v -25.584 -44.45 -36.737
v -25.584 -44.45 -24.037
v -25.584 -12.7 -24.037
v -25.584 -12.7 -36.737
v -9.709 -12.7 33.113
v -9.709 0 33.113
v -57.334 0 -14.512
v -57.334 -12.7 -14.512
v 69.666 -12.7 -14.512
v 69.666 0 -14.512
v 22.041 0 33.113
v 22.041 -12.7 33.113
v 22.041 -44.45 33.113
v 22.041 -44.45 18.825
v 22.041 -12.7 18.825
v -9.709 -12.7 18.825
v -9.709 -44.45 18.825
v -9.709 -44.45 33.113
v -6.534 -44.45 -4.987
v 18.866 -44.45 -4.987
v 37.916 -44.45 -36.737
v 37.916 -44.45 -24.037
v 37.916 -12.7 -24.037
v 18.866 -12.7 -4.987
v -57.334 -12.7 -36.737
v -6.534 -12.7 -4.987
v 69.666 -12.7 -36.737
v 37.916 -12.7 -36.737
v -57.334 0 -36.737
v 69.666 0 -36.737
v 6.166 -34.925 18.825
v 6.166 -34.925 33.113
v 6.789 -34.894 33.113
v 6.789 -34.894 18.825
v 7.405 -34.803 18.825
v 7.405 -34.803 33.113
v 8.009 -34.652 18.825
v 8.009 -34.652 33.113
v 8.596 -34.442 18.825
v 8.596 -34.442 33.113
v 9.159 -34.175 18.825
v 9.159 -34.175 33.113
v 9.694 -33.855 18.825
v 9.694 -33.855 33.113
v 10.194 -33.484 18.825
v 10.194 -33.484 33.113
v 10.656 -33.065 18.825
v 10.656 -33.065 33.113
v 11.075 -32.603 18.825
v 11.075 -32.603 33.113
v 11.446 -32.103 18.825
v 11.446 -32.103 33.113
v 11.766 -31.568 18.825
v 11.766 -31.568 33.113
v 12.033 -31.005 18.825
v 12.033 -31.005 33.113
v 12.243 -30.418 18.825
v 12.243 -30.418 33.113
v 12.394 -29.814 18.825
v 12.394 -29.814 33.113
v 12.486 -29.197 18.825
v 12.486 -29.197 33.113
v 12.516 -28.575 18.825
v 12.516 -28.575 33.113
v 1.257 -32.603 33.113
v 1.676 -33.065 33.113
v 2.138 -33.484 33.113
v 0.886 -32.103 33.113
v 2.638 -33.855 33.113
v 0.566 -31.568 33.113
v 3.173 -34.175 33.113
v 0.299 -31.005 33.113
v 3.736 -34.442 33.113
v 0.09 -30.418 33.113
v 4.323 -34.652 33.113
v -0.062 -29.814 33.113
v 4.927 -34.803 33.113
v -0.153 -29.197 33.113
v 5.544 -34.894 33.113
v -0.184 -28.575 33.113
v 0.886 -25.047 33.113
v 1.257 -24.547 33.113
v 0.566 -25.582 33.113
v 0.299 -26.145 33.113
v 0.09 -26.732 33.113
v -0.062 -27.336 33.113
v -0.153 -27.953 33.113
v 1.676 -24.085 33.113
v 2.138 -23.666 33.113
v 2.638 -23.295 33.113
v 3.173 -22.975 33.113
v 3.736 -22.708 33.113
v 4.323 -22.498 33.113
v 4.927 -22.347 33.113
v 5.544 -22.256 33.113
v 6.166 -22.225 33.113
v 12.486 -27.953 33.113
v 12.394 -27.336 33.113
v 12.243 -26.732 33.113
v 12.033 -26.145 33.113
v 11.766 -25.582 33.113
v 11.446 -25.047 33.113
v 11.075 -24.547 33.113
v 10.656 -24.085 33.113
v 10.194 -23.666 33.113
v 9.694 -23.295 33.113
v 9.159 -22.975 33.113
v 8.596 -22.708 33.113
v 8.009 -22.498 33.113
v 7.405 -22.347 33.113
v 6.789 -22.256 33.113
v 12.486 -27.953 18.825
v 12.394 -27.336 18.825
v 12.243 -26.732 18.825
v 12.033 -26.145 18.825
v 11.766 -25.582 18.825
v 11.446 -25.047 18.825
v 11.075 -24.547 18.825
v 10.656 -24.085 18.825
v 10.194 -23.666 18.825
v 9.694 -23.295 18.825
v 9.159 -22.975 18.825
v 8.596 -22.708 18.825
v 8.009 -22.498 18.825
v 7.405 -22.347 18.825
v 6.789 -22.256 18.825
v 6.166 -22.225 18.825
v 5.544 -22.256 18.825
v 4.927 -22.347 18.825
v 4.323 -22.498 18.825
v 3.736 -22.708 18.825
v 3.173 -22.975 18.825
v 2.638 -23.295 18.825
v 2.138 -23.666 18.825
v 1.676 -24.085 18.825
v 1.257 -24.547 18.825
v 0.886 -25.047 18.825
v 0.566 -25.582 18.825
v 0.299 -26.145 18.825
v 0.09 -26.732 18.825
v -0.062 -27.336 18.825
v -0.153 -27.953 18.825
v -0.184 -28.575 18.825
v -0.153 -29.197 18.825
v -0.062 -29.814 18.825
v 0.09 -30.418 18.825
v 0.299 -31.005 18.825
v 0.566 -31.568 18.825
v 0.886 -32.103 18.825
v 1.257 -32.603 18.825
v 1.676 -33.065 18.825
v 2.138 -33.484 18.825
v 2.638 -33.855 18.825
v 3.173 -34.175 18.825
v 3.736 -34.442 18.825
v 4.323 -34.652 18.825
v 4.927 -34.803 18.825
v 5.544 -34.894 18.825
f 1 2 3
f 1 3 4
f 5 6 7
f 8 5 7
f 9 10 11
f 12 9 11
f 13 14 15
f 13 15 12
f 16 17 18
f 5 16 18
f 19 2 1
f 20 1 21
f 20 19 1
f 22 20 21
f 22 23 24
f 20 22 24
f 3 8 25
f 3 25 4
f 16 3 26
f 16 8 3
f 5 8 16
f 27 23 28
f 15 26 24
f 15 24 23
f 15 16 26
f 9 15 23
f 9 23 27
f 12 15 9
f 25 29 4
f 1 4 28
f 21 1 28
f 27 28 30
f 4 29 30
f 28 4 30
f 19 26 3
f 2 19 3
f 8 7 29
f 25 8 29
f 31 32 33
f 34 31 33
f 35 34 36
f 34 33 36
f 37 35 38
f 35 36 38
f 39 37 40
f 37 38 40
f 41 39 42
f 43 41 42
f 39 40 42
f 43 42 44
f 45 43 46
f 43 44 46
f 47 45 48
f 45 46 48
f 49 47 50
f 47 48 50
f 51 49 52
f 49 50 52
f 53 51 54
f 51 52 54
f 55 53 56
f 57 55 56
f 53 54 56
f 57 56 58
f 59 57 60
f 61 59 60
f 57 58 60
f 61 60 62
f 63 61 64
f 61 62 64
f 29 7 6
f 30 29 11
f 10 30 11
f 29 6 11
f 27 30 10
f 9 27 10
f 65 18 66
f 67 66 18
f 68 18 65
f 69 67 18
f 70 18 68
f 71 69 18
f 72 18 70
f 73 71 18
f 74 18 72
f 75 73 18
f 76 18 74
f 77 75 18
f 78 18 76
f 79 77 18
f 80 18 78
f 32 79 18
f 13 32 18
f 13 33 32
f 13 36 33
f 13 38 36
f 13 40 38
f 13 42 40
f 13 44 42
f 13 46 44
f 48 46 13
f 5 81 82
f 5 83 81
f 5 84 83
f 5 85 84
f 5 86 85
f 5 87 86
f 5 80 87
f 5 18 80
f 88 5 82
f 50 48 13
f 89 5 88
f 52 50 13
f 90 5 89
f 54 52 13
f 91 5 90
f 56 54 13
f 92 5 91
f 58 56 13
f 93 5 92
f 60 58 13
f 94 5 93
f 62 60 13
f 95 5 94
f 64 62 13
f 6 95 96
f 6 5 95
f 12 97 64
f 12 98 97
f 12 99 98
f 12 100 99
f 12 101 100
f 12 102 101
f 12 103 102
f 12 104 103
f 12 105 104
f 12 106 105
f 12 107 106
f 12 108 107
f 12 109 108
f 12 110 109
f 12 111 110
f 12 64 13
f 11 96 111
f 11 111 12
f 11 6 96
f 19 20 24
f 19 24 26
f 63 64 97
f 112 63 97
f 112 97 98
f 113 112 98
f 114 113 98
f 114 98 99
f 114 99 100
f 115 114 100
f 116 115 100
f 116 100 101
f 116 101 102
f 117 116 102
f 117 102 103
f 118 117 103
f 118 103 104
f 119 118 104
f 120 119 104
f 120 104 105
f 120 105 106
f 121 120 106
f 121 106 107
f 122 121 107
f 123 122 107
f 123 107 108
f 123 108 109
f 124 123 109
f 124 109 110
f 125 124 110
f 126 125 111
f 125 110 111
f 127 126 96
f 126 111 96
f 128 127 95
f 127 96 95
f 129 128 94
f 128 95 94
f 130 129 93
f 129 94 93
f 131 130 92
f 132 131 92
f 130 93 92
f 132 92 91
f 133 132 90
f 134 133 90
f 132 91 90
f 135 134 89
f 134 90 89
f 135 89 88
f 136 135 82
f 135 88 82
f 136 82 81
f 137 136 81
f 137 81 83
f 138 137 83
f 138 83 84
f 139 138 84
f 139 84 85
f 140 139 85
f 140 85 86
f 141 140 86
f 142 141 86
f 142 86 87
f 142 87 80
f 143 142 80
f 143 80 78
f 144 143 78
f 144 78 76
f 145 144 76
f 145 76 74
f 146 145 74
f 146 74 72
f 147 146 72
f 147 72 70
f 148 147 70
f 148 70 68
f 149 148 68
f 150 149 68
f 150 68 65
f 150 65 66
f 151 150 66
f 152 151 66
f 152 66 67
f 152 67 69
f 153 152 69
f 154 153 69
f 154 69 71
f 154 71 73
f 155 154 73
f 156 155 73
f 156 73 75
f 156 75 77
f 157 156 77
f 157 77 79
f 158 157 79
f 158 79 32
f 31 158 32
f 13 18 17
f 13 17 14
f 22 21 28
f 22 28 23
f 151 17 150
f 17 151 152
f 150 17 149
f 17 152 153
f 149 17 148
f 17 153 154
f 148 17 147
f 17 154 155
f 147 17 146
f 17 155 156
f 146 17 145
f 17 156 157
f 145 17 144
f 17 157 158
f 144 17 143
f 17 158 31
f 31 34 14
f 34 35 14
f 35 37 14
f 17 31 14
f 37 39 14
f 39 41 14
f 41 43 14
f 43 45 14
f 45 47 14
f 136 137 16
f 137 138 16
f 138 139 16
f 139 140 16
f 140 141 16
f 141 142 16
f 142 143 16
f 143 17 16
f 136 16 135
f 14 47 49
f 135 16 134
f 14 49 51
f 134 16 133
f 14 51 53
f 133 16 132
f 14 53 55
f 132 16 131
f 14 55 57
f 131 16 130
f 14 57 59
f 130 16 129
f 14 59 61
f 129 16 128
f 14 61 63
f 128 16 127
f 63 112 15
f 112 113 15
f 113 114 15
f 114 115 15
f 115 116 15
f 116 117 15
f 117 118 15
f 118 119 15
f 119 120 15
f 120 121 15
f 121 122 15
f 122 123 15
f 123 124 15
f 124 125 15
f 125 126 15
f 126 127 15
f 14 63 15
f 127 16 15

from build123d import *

# Parameters (mm, degrees)
F1_DEPTH = 12.7
F3_DEPTH = 31.75
F4_W     = 31.75
F4_H     = 14.2875
F5_DEPTH = 31.75
F7_DEPTH = 25.4


with BuildPart() as f1:
    # F0 (on Front) → F1 (new body)
    with BuildSketch(Plane.XZ):
        Polygon((-57.3339015245, -14.512266928), (-57.3339015245, -36.737266928), (69.6660984755, -36.737266928), (69.6660984755, -14.512266928), (22.0410984755, 33.112733072), (-9.7089015245, 33.112733072), align=None)
    extrude(amount=F1_DEPTH)

    # F2 (on face) → F3 (join)
    with BuildSketch(Plane.XZ.offset(12.7)):
        Polygon((-25.5839015245, -36.737266928), (37.9160984755, -36.737266928), (37.9160984755, -24.037266928), (18.8660984755, -24.037266928), (18.8660984755, -4.987266928), (-6.5339015245, -4.987266928), (-6.5339015245, -24.037266928), (-25.5839015245, -24.037266928), align=None)
        Polygon((18.8660984755, -24.037266928), (37.9160984755, -24.037266928), (18.8660984755, -4.987266928), align=None)
        Polygon((-6.5339015245, -4.987266928), (-25.5839015245, -24.037266928), (-6.5339015245, -24.037266928), align=None)
    extrude(amount=F3_DEPTH)

    # F4 (on face) → F5 (join)
    with BuildSketch(Plane.XZ.offset(12.7)):
        with Locations((6.1660984755, 25.968983072)):
            Rectangle(F4_W, F4_H)
    extrude(amount=F5_DEPTH)

    # F6 (on face) → F7 (cut)
    with BuildSketch(Plane.XY.offset(33.112733072)):
        with BuildLine():
            ThreePointArc((6.1660984755, -34.925), (10.656226536, -33.0651280605), (12.5160984755, -28.575))
            ThreePointArc((12.5160984755, -28.575), (1.6759704149, -24.0848719395), (6.1660984755, -34.925))
        make_face()
    extrude(amount=-F7_DEPTH, mode=Mode.SUBTRACT)


solid = f1.part
